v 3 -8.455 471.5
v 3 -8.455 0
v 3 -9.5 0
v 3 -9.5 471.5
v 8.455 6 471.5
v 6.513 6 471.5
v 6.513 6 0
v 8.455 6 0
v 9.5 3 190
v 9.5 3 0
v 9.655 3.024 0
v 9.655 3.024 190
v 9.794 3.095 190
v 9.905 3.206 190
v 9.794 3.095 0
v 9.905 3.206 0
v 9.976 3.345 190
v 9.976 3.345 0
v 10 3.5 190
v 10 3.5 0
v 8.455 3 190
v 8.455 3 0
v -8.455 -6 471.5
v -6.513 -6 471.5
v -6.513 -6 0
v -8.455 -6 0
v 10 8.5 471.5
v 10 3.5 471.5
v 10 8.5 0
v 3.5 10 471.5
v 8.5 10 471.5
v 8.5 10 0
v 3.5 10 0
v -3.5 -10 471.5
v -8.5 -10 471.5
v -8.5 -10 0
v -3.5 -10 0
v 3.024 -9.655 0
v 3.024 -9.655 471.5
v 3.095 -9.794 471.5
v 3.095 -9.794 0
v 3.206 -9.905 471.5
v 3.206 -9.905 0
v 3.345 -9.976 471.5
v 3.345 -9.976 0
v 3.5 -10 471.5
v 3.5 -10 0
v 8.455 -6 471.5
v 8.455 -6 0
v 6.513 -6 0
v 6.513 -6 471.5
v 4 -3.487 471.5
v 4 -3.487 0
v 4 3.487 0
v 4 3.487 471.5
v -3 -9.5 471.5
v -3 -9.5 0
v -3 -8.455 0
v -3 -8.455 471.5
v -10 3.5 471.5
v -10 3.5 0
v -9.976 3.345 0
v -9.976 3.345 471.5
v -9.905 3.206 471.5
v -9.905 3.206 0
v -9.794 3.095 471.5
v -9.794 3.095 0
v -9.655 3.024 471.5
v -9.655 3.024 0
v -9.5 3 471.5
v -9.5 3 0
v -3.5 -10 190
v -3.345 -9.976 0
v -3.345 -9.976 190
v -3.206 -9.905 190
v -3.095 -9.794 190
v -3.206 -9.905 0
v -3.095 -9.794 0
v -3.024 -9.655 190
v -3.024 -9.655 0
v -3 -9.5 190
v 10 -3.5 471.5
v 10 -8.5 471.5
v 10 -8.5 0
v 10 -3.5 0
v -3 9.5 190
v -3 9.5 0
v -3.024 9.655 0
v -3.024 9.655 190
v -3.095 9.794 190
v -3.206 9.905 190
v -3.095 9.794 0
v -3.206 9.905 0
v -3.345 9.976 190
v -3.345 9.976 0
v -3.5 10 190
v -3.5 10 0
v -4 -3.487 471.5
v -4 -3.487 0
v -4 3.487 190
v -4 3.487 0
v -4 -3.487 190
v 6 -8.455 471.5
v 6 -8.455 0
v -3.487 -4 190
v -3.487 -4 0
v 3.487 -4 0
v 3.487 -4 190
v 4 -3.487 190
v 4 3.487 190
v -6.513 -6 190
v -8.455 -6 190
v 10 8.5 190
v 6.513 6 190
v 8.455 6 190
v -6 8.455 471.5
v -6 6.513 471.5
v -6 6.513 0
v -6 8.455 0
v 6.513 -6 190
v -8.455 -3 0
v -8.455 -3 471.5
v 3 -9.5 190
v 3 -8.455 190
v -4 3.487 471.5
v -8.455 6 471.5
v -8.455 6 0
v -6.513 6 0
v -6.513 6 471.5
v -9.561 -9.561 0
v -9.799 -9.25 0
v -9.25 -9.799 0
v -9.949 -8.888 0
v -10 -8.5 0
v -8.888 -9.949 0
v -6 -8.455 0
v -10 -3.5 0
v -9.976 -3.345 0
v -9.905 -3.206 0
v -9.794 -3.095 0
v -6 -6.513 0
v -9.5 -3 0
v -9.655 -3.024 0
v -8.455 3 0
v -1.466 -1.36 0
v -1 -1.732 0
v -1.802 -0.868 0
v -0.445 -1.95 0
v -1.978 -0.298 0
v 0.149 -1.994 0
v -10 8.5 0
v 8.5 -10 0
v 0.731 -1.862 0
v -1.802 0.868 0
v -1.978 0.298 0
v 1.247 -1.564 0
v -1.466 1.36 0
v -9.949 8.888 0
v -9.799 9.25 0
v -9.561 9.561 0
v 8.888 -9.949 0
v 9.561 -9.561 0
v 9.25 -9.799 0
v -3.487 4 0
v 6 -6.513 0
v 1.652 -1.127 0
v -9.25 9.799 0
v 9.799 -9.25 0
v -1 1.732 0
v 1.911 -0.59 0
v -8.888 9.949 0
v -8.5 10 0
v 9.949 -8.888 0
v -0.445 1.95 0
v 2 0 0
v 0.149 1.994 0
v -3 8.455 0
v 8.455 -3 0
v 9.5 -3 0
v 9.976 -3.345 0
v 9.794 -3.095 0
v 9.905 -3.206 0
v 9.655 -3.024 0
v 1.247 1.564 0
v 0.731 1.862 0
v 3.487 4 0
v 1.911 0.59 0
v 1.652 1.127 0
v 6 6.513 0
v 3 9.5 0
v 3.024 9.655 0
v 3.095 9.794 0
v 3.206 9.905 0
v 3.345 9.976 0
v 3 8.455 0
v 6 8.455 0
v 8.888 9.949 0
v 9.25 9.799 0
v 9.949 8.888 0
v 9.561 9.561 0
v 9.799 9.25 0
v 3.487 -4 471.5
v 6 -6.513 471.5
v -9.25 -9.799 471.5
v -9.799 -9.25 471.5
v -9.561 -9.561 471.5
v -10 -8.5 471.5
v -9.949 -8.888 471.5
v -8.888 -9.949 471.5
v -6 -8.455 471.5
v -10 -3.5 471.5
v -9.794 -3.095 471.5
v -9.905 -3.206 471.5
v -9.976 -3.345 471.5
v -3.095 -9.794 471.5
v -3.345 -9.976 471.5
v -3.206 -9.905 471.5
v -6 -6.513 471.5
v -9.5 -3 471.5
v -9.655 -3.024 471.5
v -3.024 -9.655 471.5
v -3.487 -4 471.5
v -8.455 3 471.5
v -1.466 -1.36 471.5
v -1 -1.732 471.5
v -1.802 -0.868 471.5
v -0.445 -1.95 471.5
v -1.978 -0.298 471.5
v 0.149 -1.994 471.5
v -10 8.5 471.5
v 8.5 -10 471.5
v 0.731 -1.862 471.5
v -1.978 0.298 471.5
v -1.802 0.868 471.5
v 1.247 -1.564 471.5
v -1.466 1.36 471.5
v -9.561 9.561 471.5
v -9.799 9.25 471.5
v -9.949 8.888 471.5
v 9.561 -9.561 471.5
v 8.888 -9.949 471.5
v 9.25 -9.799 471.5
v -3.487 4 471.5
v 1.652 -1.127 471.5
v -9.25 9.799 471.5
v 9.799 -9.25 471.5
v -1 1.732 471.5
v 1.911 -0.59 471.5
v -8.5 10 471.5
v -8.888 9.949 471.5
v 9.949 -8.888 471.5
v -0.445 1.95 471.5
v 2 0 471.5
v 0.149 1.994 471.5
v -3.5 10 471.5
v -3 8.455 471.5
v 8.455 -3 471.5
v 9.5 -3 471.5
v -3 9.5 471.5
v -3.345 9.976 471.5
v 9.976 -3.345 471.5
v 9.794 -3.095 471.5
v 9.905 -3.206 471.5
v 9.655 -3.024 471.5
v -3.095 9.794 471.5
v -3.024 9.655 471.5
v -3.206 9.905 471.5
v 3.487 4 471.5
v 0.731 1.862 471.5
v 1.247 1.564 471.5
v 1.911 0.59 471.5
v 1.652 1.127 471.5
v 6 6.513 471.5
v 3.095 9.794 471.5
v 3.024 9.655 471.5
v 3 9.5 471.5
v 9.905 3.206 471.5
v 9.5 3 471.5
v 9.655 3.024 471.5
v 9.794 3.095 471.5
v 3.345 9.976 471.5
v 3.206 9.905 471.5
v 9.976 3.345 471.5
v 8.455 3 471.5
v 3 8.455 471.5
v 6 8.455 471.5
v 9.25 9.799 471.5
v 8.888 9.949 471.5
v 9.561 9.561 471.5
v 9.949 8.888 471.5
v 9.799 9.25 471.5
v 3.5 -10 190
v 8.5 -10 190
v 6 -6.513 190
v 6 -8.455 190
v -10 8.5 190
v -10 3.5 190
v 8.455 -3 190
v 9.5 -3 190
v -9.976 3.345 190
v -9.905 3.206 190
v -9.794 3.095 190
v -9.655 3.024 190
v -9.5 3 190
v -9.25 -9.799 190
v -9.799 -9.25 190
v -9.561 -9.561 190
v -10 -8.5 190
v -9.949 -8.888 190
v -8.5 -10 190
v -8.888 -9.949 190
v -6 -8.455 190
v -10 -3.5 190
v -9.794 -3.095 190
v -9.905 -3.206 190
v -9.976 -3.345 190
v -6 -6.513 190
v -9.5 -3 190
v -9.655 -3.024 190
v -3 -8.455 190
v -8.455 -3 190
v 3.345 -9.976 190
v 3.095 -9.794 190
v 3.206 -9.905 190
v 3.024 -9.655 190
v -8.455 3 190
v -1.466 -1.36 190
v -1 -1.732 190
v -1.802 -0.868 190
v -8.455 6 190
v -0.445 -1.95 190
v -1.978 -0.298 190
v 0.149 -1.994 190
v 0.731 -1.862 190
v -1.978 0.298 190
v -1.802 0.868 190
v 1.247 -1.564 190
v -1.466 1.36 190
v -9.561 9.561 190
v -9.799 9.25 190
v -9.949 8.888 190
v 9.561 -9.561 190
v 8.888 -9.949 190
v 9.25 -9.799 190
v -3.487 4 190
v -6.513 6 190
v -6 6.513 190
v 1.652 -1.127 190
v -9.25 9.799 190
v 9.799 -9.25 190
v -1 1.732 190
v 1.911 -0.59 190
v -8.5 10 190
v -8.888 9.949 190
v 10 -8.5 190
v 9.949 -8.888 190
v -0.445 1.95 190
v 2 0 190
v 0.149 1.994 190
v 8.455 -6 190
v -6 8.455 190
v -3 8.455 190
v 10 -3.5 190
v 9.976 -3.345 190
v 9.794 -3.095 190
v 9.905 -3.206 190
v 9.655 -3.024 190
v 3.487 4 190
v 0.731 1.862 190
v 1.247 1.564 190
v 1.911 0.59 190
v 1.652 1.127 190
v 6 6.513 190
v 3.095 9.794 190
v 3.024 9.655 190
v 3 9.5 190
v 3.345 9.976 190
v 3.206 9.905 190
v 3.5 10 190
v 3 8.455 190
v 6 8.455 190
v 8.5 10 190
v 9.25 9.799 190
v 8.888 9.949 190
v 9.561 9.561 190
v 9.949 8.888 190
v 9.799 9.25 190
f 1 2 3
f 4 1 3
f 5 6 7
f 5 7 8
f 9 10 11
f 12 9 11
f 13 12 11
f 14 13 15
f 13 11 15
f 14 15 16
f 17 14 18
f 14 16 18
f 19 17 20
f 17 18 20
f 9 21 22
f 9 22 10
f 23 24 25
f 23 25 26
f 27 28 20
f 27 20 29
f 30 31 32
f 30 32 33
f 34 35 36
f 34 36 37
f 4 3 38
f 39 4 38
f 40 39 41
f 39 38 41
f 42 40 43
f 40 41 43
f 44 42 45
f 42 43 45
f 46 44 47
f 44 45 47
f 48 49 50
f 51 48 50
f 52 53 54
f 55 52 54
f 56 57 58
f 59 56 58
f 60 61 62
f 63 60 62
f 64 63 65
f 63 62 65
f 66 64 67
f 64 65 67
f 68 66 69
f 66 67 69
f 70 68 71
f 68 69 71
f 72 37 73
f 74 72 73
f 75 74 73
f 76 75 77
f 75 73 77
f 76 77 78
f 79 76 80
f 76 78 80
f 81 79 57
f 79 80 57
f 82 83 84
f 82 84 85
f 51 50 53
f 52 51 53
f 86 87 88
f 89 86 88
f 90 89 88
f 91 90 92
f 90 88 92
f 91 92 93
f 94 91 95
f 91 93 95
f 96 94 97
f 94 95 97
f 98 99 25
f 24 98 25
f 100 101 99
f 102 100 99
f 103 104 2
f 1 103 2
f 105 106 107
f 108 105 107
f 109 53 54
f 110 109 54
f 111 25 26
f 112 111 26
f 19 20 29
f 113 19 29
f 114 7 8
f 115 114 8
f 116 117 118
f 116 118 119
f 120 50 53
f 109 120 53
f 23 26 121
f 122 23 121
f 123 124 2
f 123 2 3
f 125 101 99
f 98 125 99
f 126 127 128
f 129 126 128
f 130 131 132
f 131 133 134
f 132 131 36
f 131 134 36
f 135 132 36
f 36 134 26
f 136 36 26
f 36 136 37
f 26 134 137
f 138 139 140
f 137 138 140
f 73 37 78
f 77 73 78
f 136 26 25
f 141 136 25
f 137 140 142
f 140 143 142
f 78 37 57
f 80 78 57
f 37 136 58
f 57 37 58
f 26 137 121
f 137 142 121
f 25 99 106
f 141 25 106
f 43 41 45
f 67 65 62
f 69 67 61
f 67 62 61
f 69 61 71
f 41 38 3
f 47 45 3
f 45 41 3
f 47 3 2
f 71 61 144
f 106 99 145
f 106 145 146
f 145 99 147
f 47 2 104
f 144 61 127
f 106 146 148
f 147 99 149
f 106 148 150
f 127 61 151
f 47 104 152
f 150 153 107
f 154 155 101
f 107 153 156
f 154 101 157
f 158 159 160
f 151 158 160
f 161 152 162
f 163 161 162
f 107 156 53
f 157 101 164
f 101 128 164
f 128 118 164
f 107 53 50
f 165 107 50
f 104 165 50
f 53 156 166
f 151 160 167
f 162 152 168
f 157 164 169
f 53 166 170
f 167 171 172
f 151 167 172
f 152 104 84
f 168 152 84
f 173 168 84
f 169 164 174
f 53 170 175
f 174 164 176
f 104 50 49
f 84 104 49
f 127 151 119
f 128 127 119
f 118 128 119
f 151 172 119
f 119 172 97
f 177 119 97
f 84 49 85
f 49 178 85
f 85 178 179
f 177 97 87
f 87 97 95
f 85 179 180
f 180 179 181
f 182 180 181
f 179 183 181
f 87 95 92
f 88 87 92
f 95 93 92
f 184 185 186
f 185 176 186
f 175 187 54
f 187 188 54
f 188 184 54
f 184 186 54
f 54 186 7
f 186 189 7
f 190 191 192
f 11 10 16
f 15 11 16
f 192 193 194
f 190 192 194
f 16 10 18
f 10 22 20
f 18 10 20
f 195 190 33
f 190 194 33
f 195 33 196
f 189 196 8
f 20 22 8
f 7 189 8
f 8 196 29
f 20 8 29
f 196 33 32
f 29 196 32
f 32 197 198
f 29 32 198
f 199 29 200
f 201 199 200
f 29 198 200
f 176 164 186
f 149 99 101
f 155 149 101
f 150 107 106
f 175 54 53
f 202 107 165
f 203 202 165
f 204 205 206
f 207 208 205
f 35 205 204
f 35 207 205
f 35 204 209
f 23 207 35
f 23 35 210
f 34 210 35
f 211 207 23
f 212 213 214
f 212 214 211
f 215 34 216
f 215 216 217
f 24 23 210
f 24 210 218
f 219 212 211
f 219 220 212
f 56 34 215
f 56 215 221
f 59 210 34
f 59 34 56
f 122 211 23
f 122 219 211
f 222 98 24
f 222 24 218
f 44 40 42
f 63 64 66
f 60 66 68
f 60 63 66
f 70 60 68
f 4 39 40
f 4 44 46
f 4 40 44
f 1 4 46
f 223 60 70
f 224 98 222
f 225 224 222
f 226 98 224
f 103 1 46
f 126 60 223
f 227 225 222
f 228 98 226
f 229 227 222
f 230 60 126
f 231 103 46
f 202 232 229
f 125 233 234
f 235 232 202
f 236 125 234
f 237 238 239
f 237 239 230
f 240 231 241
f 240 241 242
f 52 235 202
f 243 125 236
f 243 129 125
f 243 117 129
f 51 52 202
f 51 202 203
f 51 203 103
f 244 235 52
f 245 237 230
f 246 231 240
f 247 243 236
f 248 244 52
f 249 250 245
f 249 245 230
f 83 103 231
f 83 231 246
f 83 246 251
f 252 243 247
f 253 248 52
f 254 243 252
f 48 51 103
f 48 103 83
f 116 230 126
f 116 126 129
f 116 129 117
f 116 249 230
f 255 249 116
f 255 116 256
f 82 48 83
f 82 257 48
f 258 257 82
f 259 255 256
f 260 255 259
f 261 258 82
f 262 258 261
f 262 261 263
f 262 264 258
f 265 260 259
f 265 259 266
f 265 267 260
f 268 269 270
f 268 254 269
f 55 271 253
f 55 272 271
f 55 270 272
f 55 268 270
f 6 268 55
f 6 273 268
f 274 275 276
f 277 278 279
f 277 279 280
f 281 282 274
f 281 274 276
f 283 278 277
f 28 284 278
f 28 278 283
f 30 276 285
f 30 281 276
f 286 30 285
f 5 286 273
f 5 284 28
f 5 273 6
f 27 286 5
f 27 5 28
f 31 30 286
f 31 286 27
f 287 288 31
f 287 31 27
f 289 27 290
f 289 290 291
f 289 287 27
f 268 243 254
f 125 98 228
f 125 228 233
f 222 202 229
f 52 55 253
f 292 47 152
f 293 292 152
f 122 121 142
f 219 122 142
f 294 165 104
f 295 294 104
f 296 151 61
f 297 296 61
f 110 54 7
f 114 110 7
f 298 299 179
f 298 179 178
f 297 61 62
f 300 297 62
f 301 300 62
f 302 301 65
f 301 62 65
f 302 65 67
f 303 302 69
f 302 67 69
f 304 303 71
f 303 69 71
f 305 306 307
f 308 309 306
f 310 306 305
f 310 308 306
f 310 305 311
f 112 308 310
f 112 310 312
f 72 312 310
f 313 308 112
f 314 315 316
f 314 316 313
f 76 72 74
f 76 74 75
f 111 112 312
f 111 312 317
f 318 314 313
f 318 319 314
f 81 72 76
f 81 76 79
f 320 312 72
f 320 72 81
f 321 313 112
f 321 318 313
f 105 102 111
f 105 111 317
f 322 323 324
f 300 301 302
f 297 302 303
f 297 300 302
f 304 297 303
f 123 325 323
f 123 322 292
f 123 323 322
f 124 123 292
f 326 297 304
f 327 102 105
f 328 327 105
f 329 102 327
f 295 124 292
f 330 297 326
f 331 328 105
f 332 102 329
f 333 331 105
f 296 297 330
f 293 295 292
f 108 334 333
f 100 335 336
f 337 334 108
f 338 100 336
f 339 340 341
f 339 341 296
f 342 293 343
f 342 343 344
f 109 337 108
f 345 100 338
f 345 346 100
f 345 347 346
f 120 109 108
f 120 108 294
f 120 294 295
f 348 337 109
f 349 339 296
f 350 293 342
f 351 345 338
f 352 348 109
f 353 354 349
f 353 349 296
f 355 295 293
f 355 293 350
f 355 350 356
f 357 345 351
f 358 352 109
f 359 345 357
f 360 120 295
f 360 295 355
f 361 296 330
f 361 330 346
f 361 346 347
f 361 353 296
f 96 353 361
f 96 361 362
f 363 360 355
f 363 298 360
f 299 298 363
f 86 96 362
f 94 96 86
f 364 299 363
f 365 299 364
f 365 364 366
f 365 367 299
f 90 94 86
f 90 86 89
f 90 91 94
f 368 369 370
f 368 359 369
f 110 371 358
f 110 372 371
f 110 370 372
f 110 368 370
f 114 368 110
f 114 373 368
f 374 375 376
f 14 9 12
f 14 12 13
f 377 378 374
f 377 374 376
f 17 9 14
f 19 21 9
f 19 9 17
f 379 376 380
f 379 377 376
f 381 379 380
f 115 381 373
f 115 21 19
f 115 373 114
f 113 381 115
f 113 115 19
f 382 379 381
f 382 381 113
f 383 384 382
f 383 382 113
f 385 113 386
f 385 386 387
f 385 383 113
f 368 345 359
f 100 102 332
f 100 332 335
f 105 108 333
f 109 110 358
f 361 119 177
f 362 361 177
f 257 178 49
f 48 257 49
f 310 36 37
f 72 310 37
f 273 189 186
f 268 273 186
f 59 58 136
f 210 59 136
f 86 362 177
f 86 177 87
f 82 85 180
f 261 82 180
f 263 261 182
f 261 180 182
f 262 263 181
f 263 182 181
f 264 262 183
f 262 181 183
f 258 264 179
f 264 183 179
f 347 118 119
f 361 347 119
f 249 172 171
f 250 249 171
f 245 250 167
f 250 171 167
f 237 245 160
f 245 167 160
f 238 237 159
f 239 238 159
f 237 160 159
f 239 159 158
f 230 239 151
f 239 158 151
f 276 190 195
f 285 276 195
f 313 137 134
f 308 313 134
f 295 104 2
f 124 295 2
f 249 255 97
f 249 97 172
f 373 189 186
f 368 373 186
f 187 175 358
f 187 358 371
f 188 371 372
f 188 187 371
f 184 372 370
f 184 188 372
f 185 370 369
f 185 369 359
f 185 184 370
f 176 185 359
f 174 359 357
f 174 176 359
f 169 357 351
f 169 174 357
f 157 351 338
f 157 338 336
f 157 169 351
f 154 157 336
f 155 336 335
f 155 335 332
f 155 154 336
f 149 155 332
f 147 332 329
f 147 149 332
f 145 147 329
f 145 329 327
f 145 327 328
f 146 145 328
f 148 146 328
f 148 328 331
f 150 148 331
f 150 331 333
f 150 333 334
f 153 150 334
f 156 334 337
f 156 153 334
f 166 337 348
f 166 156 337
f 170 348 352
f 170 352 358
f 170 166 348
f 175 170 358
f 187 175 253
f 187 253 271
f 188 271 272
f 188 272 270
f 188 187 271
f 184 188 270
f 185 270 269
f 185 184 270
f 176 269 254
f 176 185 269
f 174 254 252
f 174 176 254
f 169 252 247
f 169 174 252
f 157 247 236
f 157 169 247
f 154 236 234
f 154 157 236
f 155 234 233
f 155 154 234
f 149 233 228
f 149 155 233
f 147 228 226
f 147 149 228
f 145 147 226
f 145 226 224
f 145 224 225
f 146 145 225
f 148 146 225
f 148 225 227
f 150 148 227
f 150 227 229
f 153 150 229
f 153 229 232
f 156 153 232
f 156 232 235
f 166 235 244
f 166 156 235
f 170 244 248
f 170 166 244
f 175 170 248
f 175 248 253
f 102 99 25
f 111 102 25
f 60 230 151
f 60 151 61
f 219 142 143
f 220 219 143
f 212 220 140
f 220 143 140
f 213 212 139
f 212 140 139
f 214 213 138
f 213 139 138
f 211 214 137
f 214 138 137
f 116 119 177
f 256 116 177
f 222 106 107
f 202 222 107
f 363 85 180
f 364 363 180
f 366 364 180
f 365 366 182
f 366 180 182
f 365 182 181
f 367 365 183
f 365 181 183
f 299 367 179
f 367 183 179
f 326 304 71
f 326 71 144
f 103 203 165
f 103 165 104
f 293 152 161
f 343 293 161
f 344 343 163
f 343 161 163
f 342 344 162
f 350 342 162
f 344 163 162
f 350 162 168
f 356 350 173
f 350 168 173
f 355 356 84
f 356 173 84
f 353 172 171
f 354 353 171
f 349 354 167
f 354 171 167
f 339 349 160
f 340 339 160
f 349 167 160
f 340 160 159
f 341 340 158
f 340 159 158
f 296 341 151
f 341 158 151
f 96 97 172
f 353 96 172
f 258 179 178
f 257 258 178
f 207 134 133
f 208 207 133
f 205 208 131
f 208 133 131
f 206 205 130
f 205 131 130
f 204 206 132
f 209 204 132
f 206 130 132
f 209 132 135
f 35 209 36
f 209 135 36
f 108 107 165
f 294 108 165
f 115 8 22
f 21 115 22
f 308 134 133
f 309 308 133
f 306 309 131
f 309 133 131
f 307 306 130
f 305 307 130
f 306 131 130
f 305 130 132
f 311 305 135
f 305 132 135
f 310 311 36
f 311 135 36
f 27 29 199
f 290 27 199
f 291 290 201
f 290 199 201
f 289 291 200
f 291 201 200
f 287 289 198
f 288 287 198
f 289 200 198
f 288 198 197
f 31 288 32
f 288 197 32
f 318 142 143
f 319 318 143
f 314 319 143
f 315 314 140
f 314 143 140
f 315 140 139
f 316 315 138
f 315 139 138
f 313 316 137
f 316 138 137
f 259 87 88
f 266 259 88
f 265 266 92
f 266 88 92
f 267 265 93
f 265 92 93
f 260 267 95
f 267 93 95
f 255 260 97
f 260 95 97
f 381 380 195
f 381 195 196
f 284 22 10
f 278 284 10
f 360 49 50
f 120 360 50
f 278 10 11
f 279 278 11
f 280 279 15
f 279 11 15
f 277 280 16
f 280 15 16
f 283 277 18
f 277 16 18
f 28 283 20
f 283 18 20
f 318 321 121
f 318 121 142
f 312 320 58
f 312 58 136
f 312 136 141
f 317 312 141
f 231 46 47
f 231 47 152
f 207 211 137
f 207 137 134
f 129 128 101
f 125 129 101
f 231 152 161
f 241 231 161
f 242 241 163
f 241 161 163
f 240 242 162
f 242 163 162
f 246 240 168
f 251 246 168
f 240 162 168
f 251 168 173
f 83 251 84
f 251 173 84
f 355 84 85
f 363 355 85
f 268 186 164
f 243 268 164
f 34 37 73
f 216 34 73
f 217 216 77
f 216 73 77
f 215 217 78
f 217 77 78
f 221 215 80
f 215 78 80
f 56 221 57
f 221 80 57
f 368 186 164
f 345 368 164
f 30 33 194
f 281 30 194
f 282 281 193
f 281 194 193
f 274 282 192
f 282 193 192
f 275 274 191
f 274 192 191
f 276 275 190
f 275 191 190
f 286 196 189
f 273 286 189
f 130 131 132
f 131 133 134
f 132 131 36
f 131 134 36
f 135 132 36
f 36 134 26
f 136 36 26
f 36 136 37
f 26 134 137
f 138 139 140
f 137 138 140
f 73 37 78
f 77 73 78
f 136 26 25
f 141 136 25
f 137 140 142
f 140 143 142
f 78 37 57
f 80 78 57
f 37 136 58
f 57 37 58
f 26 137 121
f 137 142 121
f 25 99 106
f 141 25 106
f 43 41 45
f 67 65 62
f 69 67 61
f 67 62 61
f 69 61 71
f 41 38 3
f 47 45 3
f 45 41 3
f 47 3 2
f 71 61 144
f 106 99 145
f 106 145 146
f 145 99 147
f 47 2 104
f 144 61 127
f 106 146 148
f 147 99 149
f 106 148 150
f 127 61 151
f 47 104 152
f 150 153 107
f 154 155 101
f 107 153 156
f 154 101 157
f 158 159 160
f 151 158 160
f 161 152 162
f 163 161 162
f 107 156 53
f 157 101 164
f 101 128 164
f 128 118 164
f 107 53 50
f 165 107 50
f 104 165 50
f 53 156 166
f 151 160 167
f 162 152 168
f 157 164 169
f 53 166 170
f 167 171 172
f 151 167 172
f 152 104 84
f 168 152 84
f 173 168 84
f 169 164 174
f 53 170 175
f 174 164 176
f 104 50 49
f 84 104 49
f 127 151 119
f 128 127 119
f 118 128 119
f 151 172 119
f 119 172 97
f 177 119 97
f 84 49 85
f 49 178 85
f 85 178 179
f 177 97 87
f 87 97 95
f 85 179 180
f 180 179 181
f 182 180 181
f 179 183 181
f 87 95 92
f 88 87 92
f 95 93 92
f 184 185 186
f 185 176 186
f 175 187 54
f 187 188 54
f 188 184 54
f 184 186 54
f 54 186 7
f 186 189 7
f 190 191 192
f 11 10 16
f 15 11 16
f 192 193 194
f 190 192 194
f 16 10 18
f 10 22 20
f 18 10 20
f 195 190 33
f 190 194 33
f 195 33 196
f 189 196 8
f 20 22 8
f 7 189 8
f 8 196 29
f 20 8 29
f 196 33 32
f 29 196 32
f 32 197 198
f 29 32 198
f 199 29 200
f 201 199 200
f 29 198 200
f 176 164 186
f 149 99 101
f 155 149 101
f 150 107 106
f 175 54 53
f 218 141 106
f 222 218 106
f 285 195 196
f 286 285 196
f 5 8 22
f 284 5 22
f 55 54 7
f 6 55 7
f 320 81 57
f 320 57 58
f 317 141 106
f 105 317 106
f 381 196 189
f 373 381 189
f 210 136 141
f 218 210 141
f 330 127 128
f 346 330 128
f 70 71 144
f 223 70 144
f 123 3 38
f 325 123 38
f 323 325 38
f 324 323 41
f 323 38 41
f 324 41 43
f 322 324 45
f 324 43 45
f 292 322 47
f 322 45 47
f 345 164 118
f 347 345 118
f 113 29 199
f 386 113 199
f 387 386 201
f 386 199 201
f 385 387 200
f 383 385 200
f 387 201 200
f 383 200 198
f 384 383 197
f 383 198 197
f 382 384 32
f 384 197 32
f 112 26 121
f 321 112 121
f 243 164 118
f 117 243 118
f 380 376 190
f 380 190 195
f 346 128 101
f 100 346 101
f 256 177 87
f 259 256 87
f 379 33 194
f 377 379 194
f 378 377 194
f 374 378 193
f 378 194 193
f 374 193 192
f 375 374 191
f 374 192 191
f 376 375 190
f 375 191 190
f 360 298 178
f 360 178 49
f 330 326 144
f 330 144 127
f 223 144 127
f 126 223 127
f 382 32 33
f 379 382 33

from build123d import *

# Parameters (mm, degrees)
F0_R     = 2
F1_DEPTH = 190
F2_DEPTH = 471.5


with BuildPart() as f1:
    # F0 (on Top) → F1 (new body)
    with BuildSketch(Plane.XY):
        with BuildLine():
            Line((8.455436, 3), (9.5, 3))
            ThreePointArc((9.5, 3), (9.853553, 3.146447), (10, 3.5))
            Line((10, 3.5), (10, 8.5))
            ThreePointArc((10, 8.5), (9.56066, 9.56066), (8.5, 10))
            Line((8.5, 10), (3.5, 10))
            ThreePointArc((3.5, 10), (3.146447, 9.853553), (3, 9.5))
            Line((3, 9.5), (3, 8.455436))
            Line((3, 8.455436), (6, 8.455436))
            Line((6, 8.455436), (6, 6.512804))
            Line((6, 6.512804), (3.487196, 4))
            Line((3.487196, 4), (0, 4))
            Line((0, 4), (-3.487196, 4))
            Line((-3.487196, 4), (-6, 6.512804))
            Line((-6, 6.512804), (-6, 8.455436))
            Line((-6, 8.455436), (-3, 8.455436))
            Line((-3, 8.455436), (-3, 9.5))
            ThreePointArc((-3, 9.5), (-3.146447, 9.853553), (-3.5, 10))
            Line((-3.5, 10), (-8.5, 10))
            ThreePointArc((-8.5, 10), (-9.56066, 9.56066), (-10, 8.5))
            Line((-10, 8.5), (-10, 3.5))
            ThreePointArc((-10, 3.5), (-9.853553, 3.146447), (-9.5, 3))
            Line((-9.5, 3), (-8.455436, 3))
            Line((-8.455436, 3), (-8.455436, 6))
            Line((-8.455436, 6), (-6.512804, 6))
            Line((-6.512804, 6), (-4, 3.487196))
            Line((-4, 3.487196), (-4, 0))
            Line((-4, 0), (-4, -3.487196))
            Line((-4, -3.487196), (-6.512804, -6))
            Line((-6.512804, -6), (-8.455436, -6))
            Line((-8.455436, -6), (-8.455436, -3))
            Line((-8.455436, -3), (-9.5, -3))
            ThreePointArc((-9.5, -3), (-9.853553, -3.146447), (-10, -3.5))
            Line((-10, -3.5), (-10, -8.5))
            ThreePointArc((-10, -8.5), (-9.56066, -9.56066), (-8.5, -10))
            Line((-8.5, -10), (-3.5, -10))
            ThreePointArc((-3.5, -10), (-3.146447, -9.853553), (-3, -9.5))
            Line((-3, -9.5), (-3, -8.455436))
            Line((-3, -8.455436), (-6, -8.455436))
            Line((-6, -8.455436), (-6, -6.512804))
            Line((-6, -6.512804), (-3.487196, -4))
            Line((-3.487196, -4), (0, -4))
            Line((0, -4), (3.487196, -4))
            Line((3.487196, -4), (6, -6.512804))
            Line((6, -6.512804), (6, -8.455436))
            Line((6, -8.455436), (3, -8.455436))
            Line((3, -8.455436), (3, -9.5))
            ThreePointArc((3, -9.5), (3.146447, -9.853553), (3.5, -10))
            Line((3.5, -10), (8.5, -10))
            ThreePointArc((8.5, -10), (9.56066, -9.56066), (10, -8.5))
            Line((10, -8.5), (10, -3.5))
            ThreePointArc((10, -3.5), (9.853553, -3.146447), (9.5, -3))
            Line((9.5, -3), (8.455436, -3))
            Line((8.455436, -3), (8.455436, -6))
            Line((8.455436, -6), (6.512804, -6))
            Line((6.512804, -6), (4, -3.487196))
            Line((4, -3.487196), (4, 0))
            Line((4, 0), (4, 3.487196))
            Line((4, 3.487196), (6.512804, 6))
            Line((6.512804, 6), (8.455436, 6))
            Line((8.455436, 6), (8.455436, 3))
        make_face()
        Circle(F0_R, mode=Mode.SUBTRACT)
    extrude(amount=F1_DEPTH)


with BuildPart() as f2:
    # F0 (on Top) → F2 (new body)
    with BuildSketch(Plane.XY):
        with BuildLine():
            Line((8.455436, 3), (9.5, 3))
            ThreePointArc((9.5, 3), (9.853553, 3.146447), (10, 3.5))
            Line((10, 3.5), (10, 8.5))
            ThreePointArc((10, 8.5), (9.56066, 9.56066), (8.5, 10))
            Line((8.5, 10), (3.5, 10))
            ThreePointArc((3.5, 10), (3.146447, 9.853553), (3, 9.5))
            Line((3, 9.5), (3, 8.455436))
            Line((3, 8.455436), (6, 8.455436))
            Line((6, 8.455436), (6, 6.512804))
            Line((6, 6.512804), (3.487196, 4))
            Line((3.487196, 4), (0, 4))
            Line((0, 4), (-3.487196, 4))
            Line((-3.487196, 4), (-6, 6.512804))
            Line((-6, 6.512804), (-6, 8.455436))
            Line((-6, 8.455436), (-3, 8.455436))
            Line((-3, 8.455436), (-3, 9.5))
            ThreePointArc((-3, 9.5), (-3.146447, 9.853553), (-3.5, 10))
            Line((-3.5, 10), (-8.5, 10))
            ThreePointArc((-8.5, 10), (-9.56066, 9.56066), (-10, 8.5))
            Line((-10, 8.5), (-10, 3.5))
            ThreePointArc((-10, 3.5), (-9.853553, 3.146447), (-9.5, 3))
            Line((-9.5, 3), (-8.455436, 3))
            Line((-8.455436, 3), (-8.455436, 6))
            Line((-8.455436, 6), (-6.512804, 6))
            Line((-6.512804, 6), (-4, 3.487196))
            Line((-4, 3.487196), (-4, 0))
            Line((-4, 0), (-4, -3.487196))
            Line((-4, -3.487196), (-6.512804, -6))
            Line((-6.512804, -6), (-8.455436, -6))
            Line((-8.455436, -6), (-8.455436, -3))
            Line((-8.455436, -3), (-9.5, -3))
            ThreePointArc((-9.5, -3), (-9.853553, -3.146447), (-10, -3.5))
            Line((-10, -3.5), (-10, -8.5))
            ThreePointArc((-10, -8.5), (-9.56066, -9.56066), (-8.5, -10))
            Line((-8.5, -10), (-3.5, -10))
            ThreePointArc((-3.5, -10), (-3.146447, -9.853553), (-3, -9.5))
            Line((-3, -9.5), (-3, -8.455436))
            Line((-3, -8.455436), (-6, -8.455436))
            Line((-6, -8.455436), (-6, -6.512804))
            Line((-6, -6.512804), (-3.487196, -4))
            Line((-3.487196, -4), (0, -4))
            Line((0, -4), (3.487196, -4))
            Line((3.487196, -4), (6, -6.512804))
            Line((6, -6.512804), (6, -8.455436))
            Line((6, -8.455436), (3, -8.455436))
            Line((3, -8.455436), (3, -9.5))
            ThreePointArc((3, -9.5), (3.146447, -9.853553), (3.5, -10))
            Line((3.5, -10), (8.5, -10))
            ThreePointArc((8.5, -10), (9.56066, -9.56066), (10, -8.5))
            Line((10, -8.5), (10, -3.5))
            ThreePointArc((10, -3.5), (9.853553, -3.146447), (9.5, -3))
            Line((9.5, -3), (8.455436, -3))
            Line((8.455436, -3), (8.455436, -6))
            Line((8.455436, -6), (6.512804, -6))
            Line((6.512804, -6), (4, -3.487196))
            Line((4, -3.487196), (4, 0))
            Line((4, 0), (4, 3.487196))
            Line((4, 3.487196), (6.512804, 6))
            Line((6.512804, 6), (8.455436, 6))
            Line((8.455436, 6), (8.455436, 3))
        make_face()
        Circle(F0_R, mode=Mode.SUBTRACT)
    extrude(amount=F2_DEPTH)


solid = Compound([f1.part, f2.part])
